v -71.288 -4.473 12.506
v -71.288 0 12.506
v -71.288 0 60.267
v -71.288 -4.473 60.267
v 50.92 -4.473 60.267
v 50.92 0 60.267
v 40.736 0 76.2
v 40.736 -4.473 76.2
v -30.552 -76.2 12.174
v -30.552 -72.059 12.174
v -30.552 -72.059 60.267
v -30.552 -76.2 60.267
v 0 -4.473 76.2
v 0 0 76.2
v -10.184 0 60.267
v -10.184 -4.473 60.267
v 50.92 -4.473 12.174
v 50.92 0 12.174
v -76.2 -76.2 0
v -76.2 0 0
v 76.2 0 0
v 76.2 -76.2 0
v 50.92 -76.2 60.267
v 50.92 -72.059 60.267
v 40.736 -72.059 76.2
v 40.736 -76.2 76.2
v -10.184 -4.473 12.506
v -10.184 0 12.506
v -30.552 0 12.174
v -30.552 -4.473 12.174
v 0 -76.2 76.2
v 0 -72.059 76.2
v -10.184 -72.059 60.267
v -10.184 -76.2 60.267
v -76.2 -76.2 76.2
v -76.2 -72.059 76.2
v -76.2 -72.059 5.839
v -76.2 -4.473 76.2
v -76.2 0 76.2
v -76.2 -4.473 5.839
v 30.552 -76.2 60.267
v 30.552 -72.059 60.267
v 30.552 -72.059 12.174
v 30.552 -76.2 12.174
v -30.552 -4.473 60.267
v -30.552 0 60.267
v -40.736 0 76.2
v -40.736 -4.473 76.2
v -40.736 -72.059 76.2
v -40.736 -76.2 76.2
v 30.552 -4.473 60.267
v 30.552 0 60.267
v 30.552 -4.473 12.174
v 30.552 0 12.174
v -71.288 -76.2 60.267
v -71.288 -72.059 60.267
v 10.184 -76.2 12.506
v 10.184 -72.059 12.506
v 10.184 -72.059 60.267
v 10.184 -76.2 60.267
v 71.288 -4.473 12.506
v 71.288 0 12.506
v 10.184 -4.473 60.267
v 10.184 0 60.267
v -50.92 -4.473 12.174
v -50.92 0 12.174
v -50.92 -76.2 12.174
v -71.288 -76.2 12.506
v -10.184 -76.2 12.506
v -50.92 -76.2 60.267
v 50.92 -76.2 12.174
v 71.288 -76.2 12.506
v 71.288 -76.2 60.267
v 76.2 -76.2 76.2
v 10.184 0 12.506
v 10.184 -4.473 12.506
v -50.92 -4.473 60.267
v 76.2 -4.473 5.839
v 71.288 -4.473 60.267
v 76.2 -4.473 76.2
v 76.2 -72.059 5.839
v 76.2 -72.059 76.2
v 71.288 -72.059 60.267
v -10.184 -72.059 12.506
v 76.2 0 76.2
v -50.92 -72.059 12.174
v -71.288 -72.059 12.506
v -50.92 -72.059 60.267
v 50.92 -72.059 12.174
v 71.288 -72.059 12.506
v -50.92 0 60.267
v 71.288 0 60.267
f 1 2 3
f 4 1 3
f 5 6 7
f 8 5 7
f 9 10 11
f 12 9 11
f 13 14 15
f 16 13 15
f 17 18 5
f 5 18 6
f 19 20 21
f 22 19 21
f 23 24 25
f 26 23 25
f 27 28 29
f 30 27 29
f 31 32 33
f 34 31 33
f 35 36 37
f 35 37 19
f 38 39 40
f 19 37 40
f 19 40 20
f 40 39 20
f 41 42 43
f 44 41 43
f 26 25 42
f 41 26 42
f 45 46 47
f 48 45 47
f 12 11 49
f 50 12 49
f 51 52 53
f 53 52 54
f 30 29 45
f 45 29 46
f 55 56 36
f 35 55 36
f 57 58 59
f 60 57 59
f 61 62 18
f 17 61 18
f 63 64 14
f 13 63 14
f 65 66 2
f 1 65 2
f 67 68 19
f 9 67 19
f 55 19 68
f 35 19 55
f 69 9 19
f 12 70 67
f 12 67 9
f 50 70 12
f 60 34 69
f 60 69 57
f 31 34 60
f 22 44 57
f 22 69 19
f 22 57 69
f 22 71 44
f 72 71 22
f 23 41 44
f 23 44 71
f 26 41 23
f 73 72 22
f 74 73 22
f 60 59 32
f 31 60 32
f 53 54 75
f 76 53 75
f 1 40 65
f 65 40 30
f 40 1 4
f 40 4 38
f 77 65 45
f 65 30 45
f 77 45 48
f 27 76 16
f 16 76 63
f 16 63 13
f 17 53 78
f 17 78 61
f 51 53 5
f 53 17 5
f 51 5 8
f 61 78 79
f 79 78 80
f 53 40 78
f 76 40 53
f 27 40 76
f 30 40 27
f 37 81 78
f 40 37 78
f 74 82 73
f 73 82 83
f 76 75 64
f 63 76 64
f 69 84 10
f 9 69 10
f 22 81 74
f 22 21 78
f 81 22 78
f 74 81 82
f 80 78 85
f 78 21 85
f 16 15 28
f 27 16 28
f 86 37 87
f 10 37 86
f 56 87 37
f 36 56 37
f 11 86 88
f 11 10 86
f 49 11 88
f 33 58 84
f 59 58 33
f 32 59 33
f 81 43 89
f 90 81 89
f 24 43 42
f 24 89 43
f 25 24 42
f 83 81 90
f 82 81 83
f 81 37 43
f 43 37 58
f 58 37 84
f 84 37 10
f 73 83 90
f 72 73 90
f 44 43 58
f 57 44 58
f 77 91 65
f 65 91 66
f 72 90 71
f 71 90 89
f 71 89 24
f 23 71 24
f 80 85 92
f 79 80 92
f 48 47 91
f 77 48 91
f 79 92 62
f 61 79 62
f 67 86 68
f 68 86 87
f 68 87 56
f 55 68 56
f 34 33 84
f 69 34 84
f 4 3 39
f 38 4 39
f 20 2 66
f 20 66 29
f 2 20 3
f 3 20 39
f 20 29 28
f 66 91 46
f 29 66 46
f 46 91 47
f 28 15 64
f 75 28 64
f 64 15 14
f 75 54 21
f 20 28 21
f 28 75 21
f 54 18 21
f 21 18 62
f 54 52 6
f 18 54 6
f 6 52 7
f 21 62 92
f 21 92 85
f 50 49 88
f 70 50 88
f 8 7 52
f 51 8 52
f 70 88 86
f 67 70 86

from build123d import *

# Parameters (mm, degrees)
F1_DEPTH = 76.2
F2_W     = 67.586093
F2_H     = 79.264563
F3_DEPTH = 177.8


with BuildPart() as f1:
    # F0 (on Front) → F1 (new body)
    with BuildSketch(Plane.XZ):
        Polygon((0, 76.2), (0, 0), (76.2, 0), (76.2, 76.2), (71.288093, 60.266774), (71.288093, 48.327021), (71.288093, 12.505721), (50.920066, 12.174042), (50.920066, 48.327021), (50.920066, 60.266774), (40.736053, 76.2), (30.55204, 60.266774), (30.55204, 48.327021), (30.55204, 12.174042), (10.184013, 12.505721), (10.184013, 48.327021), (10.184013, 60.266774), align=None)
        Polygon((-76.2, 0), (0, 0), (0, 76.2), (-10.184013, 60.266774), (-10.184013, 48.327021), (-10.184013, 12.505721), (-30.55204, 12.174042), (-30.55204, 48.327021), (-30.55204, 60.266774), (-40.736053, 76.2), (-50.920066, 60.266774), (-50.920066, 48.327021), (-50.920066, 12.174042), (-71.288093, 12.505721), (-71.288093, 48.327021), (-71.288093, 60.266774), (-76.2, 76.2), align=None)
    extrude(amount=F1_DEPTH)

    # F2 (on face) → F3 (cut)
    with BuildSketch(Plane.YZ.offset(76.2)):
        with Locations((-38.265653, 45.471521)):
            Rectangle(F2_W, F2_H)
    extrude(amount=-F3_DEPTH, mode=Mode.SUBTRACT)


solid = f1.part
